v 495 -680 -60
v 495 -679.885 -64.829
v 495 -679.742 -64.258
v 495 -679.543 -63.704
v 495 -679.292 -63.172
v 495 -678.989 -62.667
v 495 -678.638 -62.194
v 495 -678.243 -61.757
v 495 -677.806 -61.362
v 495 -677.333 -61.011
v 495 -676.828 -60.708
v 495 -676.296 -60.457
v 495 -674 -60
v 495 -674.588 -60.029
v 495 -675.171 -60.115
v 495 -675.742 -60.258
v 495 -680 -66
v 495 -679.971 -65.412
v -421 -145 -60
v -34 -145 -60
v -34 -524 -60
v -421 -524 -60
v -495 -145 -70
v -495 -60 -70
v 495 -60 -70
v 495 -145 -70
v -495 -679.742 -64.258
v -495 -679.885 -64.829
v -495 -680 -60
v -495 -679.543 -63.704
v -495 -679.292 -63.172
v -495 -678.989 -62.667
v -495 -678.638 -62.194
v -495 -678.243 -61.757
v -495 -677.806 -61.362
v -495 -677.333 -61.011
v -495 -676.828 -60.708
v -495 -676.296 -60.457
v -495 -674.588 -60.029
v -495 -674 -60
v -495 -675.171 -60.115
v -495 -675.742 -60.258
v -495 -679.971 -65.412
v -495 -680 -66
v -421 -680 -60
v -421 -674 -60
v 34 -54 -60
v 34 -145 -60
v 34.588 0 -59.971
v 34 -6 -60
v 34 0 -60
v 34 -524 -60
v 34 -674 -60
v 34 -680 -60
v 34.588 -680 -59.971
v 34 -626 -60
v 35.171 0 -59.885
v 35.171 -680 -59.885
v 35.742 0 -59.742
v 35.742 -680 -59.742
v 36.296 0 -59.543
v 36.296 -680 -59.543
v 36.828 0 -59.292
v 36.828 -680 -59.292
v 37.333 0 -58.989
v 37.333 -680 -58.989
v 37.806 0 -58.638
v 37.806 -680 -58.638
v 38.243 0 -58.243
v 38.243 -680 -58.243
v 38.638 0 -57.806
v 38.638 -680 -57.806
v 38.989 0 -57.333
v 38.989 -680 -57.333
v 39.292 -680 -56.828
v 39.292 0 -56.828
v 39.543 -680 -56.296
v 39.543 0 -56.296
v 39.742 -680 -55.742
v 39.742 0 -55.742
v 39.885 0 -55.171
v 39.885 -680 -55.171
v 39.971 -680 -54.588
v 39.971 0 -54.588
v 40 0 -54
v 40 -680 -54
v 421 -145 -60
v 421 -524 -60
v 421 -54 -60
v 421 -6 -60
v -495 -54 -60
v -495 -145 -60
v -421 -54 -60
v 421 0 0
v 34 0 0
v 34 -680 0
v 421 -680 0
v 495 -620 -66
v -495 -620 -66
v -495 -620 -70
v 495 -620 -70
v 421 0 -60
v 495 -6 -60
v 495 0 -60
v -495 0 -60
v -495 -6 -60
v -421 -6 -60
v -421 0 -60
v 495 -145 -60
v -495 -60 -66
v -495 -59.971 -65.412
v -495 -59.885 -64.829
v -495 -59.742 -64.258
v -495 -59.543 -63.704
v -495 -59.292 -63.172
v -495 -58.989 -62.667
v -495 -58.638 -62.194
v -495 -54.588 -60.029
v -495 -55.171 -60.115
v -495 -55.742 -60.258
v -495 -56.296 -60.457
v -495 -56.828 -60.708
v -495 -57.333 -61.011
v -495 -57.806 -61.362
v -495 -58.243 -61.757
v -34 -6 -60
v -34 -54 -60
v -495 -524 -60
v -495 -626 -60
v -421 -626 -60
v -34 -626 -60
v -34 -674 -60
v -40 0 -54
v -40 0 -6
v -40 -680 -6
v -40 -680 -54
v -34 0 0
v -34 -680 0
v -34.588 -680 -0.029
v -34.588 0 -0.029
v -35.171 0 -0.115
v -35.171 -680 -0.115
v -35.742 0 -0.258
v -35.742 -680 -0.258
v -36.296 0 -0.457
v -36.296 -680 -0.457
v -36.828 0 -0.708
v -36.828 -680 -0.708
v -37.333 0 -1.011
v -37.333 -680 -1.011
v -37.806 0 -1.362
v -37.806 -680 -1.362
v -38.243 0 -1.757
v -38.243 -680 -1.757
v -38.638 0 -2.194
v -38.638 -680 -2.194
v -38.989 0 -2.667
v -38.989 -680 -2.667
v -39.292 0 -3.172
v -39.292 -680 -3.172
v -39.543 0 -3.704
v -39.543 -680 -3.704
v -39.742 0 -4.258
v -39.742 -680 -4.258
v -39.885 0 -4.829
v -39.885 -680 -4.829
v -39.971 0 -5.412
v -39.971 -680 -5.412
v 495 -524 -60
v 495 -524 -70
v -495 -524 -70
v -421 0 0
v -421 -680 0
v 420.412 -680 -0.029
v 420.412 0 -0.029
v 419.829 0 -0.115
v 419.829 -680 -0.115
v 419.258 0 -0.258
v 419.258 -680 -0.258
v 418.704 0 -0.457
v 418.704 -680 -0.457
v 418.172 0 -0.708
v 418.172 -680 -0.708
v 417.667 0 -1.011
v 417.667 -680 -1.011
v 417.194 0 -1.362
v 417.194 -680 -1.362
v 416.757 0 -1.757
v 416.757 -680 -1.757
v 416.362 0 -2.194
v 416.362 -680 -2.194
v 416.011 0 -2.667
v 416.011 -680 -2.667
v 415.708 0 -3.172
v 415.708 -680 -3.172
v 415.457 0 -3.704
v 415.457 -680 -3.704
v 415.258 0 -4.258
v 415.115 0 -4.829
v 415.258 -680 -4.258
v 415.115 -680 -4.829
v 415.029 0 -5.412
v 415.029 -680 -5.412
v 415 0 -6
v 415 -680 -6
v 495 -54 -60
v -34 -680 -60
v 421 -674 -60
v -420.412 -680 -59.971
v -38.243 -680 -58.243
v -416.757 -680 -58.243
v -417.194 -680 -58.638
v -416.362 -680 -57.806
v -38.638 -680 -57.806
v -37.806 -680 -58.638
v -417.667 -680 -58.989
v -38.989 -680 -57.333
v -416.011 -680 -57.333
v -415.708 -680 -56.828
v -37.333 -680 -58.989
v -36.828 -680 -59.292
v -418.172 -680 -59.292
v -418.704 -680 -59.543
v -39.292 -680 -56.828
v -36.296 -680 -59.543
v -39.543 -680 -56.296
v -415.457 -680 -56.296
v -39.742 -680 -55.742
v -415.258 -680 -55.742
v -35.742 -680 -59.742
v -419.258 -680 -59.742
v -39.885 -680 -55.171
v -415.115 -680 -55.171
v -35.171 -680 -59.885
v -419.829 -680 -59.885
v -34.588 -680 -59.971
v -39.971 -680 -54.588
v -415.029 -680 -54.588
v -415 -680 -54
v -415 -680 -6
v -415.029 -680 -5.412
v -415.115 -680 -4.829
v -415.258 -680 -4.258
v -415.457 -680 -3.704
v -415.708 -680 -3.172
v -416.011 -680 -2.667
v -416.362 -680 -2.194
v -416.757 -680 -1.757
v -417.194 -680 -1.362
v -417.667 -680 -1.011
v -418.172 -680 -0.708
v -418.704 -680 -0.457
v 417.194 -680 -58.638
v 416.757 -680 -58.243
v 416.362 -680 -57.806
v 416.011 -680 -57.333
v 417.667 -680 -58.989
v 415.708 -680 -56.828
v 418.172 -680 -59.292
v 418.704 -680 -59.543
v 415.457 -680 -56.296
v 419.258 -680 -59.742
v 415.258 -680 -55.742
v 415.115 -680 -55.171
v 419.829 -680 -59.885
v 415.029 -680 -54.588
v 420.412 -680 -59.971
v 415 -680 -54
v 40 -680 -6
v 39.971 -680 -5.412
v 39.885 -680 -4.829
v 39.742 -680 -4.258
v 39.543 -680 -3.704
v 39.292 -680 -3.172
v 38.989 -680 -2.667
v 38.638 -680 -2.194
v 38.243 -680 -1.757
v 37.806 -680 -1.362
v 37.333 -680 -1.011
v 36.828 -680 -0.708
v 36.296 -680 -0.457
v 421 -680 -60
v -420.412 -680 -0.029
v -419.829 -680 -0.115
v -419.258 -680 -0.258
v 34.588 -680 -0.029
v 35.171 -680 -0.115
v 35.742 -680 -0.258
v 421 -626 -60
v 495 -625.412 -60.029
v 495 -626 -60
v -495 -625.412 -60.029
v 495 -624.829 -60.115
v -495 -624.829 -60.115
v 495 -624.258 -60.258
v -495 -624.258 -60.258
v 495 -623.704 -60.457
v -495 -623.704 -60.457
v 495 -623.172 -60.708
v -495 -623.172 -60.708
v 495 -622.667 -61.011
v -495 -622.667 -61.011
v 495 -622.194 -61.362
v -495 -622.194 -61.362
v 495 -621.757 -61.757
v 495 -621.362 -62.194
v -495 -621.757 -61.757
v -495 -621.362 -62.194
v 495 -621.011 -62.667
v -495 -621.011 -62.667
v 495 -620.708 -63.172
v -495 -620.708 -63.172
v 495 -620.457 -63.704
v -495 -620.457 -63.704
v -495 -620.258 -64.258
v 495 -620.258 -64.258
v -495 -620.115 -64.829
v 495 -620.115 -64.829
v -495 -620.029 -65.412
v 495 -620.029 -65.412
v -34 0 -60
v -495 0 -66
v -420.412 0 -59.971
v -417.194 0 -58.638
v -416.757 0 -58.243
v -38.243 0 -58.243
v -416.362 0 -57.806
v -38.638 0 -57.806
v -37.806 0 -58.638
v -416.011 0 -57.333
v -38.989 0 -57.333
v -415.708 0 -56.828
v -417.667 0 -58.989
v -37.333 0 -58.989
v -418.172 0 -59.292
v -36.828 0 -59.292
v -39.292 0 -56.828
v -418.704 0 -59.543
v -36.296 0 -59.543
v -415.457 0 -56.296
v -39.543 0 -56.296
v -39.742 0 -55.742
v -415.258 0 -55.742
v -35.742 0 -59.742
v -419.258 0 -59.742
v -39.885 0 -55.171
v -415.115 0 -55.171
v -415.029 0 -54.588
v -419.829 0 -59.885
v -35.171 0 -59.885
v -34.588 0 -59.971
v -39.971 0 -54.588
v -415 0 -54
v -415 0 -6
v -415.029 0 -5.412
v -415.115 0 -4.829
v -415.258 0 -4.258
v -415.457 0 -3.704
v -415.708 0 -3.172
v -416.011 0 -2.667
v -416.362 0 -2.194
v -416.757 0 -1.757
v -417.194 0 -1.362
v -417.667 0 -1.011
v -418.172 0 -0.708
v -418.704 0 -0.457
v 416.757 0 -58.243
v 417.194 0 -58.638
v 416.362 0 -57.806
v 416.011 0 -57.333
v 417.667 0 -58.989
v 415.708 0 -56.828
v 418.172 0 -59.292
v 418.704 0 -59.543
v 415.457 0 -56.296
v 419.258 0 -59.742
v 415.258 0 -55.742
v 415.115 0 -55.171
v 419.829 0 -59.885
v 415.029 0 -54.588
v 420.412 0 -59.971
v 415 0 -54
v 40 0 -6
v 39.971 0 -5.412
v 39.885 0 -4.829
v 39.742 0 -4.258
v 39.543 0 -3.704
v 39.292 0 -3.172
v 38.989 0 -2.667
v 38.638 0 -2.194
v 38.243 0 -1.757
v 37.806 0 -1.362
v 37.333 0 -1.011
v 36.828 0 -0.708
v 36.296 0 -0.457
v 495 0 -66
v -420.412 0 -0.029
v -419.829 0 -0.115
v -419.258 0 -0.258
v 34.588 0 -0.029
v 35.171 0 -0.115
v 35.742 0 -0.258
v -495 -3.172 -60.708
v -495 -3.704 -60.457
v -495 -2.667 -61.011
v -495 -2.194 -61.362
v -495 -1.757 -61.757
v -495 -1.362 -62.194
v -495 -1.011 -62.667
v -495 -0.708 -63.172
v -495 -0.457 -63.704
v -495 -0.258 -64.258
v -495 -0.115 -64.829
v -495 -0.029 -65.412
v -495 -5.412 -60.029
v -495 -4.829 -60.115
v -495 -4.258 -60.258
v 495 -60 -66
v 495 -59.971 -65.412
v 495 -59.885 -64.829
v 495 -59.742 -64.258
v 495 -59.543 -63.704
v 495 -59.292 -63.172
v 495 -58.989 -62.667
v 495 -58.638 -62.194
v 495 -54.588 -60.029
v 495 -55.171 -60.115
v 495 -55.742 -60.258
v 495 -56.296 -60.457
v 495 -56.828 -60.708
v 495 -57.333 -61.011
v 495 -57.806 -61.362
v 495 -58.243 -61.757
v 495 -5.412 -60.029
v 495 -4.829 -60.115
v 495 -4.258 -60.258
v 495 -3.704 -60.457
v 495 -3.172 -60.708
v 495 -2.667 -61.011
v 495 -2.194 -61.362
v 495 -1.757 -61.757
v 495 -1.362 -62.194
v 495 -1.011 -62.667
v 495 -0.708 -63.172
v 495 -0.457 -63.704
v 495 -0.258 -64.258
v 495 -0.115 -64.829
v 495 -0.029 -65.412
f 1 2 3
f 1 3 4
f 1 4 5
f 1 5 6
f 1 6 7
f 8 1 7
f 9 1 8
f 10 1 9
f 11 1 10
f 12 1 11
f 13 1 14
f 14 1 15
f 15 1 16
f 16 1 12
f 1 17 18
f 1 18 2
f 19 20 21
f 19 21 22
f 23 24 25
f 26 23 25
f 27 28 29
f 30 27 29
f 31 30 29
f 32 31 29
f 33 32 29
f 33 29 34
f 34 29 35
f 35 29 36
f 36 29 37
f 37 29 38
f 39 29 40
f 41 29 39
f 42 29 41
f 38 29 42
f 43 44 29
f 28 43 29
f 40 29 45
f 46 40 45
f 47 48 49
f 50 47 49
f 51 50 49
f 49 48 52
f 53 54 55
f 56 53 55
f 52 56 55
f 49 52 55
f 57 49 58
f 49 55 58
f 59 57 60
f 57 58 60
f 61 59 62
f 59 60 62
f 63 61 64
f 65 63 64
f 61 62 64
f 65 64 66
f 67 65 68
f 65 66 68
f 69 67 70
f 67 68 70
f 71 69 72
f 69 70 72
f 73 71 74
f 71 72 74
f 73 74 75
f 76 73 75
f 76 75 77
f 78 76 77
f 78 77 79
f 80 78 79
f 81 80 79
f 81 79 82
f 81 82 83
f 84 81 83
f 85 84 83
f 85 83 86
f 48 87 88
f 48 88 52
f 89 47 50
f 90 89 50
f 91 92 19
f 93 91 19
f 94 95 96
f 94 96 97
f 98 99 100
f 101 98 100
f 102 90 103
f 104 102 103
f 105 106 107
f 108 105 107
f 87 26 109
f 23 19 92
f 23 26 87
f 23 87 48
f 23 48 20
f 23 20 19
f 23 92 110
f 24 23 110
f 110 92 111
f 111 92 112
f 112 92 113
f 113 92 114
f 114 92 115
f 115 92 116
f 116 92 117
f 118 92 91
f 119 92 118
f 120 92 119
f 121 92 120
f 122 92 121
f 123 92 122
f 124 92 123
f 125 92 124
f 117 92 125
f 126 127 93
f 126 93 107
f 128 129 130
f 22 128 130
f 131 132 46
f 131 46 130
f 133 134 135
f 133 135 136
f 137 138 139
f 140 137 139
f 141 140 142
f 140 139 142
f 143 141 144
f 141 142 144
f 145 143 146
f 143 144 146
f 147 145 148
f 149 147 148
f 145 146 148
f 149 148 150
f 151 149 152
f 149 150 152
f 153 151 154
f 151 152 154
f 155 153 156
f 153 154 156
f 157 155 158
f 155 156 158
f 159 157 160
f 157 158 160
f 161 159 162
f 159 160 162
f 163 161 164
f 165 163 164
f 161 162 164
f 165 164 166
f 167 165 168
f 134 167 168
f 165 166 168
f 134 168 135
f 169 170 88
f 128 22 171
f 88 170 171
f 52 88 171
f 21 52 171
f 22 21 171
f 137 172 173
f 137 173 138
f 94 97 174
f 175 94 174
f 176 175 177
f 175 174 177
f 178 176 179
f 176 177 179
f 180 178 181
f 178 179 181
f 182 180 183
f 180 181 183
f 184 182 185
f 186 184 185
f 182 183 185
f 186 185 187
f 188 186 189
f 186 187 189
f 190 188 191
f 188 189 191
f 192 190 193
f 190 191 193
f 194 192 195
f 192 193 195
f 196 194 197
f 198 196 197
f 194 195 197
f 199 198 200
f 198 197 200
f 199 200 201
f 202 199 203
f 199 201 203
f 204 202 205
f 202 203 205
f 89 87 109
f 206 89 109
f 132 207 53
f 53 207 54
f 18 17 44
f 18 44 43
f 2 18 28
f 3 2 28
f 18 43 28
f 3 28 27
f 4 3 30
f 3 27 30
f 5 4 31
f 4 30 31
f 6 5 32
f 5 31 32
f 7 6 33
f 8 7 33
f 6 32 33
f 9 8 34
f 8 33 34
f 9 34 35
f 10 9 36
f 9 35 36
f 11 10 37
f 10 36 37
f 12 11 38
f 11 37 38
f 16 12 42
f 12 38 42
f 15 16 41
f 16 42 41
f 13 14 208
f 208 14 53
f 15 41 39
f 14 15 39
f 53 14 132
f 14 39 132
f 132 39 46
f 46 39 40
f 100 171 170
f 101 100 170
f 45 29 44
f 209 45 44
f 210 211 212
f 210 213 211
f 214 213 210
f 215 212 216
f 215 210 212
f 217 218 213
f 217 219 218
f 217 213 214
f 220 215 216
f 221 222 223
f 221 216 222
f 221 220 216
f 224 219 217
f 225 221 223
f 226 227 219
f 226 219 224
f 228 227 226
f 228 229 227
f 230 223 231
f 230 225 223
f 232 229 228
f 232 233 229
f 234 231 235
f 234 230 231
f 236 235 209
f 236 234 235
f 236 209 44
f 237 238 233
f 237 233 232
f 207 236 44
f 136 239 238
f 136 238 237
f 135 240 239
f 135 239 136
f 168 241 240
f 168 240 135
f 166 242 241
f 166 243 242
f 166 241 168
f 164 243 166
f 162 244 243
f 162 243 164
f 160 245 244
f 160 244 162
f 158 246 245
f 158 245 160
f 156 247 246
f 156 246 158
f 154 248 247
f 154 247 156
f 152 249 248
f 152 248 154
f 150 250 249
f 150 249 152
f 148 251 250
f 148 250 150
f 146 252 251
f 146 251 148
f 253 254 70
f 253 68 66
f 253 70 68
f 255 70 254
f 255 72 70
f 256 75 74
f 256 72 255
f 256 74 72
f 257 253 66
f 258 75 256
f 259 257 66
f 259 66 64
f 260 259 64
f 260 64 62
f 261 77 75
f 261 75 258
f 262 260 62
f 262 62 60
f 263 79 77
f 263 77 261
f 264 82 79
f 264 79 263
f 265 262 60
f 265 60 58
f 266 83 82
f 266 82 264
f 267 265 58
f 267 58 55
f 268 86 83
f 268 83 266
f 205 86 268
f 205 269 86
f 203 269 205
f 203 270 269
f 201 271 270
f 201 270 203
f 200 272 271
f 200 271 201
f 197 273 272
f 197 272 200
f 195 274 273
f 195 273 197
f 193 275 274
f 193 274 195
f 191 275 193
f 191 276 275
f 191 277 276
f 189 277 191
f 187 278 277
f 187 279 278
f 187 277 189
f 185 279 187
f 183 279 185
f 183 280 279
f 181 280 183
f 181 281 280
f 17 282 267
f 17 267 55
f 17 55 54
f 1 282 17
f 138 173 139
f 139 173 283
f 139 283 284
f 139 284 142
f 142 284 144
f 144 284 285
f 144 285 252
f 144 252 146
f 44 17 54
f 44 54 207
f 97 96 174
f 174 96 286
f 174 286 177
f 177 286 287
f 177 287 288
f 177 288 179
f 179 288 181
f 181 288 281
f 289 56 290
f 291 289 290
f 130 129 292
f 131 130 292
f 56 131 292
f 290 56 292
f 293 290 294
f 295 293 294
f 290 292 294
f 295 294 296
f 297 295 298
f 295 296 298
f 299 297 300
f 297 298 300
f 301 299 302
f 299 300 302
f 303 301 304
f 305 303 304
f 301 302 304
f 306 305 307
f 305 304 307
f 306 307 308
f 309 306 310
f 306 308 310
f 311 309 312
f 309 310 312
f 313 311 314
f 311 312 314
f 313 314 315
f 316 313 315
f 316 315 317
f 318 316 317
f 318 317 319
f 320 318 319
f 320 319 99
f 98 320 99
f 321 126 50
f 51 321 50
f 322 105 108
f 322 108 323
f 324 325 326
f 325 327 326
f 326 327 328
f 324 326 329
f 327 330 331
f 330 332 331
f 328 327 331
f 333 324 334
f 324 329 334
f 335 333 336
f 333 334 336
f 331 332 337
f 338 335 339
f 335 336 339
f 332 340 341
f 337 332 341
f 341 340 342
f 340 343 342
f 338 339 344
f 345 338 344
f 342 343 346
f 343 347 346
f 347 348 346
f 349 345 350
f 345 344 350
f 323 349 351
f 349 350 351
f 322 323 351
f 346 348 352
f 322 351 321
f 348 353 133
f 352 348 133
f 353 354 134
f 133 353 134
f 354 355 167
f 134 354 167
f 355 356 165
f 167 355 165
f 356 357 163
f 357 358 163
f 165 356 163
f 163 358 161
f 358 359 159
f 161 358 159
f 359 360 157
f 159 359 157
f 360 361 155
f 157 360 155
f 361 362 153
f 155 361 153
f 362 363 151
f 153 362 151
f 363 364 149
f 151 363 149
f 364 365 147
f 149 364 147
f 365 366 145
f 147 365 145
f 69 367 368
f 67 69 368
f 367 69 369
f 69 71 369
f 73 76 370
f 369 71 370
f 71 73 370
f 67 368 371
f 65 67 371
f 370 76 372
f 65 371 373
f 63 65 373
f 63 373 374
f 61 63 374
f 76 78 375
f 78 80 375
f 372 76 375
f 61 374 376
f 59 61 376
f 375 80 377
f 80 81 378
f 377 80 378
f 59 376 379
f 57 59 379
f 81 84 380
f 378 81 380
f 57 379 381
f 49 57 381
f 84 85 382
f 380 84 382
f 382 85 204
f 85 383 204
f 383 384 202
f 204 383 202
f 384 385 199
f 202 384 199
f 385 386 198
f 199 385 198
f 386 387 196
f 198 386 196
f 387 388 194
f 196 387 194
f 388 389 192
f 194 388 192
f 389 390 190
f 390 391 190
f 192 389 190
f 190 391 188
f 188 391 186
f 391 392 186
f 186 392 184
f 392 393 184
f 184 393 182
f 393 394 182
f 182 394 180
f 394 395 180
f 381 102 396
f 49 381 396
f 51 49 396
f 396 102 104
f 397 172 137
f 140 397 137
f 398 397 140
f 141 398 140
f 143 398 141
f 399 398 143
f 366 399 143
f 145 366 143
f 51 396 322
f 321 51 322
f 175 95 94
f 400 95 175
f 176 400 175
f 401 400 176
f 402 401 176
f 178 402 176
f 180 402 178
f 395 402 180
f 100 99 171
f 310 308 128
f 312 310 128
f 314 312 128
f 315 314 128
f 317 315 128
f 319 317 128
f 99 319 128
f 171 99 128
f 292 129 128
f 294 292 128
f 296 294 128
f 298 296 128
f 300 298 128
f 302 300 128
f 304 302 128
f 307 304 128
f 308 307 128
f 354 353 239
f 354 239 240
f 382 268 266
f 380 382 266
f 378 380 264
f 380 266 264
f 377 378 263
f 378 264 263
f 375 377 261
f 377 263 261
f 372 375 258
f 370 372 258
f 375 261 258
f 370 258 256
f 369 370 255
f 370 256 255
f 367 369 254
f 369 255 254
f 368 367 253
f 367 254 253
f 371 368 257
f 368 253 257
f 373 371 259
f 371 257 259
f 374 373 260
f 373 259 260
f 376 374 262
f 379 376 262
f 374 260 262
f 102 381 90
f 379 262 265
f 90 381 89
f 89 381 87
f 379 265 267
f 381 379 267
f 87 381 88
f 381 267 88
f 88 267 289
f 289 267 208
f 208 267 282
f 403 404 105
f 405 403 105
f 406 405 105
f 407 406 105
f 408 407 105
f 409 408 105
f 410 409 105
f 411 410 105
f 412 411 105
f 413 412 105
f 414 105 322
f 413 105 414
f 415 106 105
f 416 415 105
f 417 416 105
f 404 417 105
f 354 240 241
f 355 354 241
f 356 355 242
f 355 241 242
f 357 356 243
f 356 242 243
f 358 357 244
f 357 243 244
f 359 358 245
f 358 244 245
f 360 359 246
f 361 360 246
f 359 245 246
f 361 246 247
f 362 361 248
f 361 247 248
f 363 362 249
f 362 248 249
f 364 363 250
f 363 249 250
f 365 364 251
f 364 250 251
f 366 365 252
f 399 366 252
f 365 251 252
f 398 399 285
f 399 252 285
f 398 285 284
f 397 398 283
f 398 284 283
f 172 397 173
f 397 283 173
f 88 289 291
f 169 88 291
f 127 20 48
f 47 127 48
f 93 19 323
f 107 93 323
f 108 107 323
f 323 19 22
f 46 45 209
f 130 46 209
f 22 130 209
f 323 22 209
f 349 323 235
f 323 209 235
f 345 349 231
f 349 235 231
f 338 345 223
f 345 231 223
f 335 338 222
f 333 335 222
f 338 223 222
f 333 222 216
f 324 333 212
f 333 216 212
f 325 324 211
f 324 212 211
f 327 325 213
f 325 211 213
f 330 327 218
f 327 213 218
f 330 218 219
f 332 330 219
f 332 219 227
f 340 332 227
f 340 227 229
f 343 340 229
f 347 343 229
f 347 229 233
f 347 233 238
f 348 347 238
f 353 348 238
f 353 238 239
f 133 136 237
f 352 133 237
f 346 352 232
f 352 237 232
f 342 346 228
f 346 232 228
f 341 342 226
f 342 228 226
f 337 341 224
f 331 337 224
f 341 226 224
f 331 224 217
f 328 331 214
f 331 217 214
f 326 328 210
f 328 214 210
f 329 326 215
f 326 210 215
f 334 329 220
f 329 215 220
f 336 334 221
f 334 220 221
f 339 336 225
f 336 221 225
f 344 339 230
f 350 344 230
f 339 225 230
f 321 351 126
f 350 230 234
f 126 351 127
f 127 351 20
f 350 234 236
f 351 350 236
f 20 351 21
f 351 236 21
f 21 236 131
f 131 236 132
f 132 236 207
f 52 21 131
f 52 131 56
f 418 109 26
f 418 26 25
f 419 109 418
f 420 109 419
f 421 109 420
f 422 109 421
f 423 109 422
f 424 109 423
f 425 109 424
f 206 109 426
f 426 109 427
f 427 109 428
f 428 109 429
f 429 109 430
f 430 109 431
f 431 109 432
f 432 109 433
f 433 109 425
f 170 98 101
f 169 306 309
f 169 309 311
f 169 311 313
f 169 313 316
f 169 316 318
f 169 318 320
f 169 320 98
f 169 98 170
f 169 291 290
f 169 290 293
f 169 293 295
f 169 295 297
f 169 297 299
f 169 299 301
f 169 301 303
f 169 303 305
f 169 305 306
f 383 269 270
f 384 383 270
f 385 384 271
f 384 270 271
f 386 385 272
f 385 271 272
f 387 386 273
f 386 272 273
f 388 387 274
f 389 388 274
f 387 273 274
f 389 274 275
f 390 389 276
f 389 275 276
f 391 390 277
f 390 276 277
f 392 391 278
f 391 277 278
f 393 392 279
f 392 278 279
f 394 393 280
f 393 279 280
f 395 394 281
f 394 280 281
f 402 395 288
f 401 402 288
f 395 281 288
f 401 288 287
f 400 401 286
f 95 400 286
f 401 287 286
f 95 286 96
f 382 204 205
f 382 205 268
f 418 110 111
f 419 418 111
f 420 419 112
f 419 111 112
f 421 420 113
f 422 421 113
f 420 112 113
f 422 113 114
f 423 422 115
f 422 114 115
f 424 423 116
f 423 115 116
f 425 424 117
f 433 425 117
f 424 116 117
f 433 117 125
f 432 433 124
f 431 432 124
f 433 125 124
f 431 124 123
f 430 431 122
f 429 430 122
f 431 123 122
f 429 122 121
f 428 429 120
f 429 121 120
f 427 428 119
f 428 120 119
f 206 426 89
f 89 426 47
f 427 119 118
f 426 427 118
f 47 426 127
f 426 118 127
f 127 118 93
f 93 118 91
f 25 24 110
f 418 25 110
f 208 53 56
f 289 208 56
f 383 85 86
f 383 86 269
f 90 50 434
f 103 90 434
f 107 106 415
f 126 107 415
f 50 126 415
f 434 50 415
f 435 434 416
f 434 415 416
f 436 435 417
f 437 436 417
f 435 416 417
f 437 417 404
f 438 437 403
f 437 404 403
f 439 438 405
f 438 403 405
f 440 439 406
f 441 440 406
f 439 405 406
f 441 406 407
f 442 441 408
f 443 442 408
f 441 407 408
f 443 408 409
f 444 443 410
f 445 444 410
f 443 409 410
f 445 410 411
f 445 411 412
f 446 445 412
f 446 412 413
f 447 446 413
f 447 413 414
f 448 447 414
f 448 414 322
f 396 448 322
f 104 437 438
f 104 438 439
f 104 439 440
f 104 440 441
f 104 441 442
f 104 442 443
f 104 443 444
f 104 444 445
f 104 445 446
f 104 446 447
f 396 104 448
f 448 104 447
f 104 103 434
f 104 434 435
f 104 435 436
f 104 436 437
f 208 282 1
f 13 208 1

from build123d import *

# Parameters (mm, degrees)
SKETCH1_W           = 990
SKETCH1_H           = 680
BOSS_EXTRUDE1_DEPTH = 70
SKETCH2_W           = 990
SKETCH2_H           = 379
CUT_EXTRUDE1_DEPTH  = 10
CUT_EXTRUDE2_DEPTH  = 1204.079382252
CUT_EXTRUDE4_DEPTH  = 844.993483387


with BuildPart() as part:
    # Sketch1 → Boss-Extrude1 (new body)
    with BuildSketch(Plane.XY):
        with Locations((0, -340)):
            Rectangle(SKETCH1_W, SKETCH1_H)
    extrude(amount=-BOSS_EXTRUDE1_DEPTH)

    # Sketch2 → Cut-Extrude1 (cut)
    with BuildSketch(Plane(origin=(0, 0, -70), x_dir=(-1, 0, 0), z_dir=(0, 0, -1))):
        with Locations((0, -334.5)):
            Rectangle(SKETCH2_W, SKETCH2_H)
    extrude(amount=-CUT_EXTRUDE1_DEPTH, mode=Mode.SUBTRACT)

    # Sketch3 → Cut-Extrude2 (cut, through all)
    with BuildSketch(Plane.ZY.offset(495)):
        with BuildLine():
            Line((-134, -680), (-66, -680))
            ThreePointArc((-66, -680), (-61.757359313, -678.242640687), (-60, -674))
            Line((-60, -674), (-60, -626))
            ThreePointArc((-60, -626), (-61.757359313, -621.757359313), (-66, -620))
            Line((-66, -620), (-134, -620))
            ThreePointArc((-134, -620), (-138.242640687, -621.757359313), (-140, -626))
            Line((-140, -626), (-140, -674))
            ThreePointArc((-140, -674), (-138.242640687, -678.242640687), (-134, -680))
        make_face()
        with BuildLine():
            Line((-134, -60), (-66, -60))
            ThreePointArc((-66, -60), (-61.757359313, -58.242640687), (-60, -54))
            Line((-60, -54), (-60, -6))
            ThreePointArc((-60, -6), (-61.757359313, -1.757359313), (-66, 0))
            Line((-66, 0), (-134, 0))
            ThreePointArc((-134, 0), (-138.242640687, -1.757359313), (-140, -6))
            Line((-140, -6), (-140, -54))
            ThreePointArc((-140, -54), (-138.242640687, -58.242640687), (-134, -60))
        make_face()
    extrude(amount=-CUT_EXTRUDE2_DEPTH, mode=Mode.SUBTRACT)

    # Sketch5 → Cut-Extrude4 (cut, through all)
    with BuildSketch(Plane.XZ.offset(680)):
        with BuildLine():
            ThreePointArc((495, -6), (493.242640687, -1.757359313), (489, 0))
            Line((489, 0), (489, -60))
            ThreePointArc((489, -60), (493.242640687, -58.242640687), (495, -54))
            Line((495, -54), (495, -6))
        make_face()
        with BuildLine():
            Line((489, 0), (421, 0))
            ThreePointArc((421, 0), (416.757359313, -1.757359313), (415, -6))
            Line((415, -6), (415, -54))
            ThreePointArc((415, -54), (416.757359313, -58.242640687), (421, -60))
            Line((421, -60), (489, -60))
            Line((489, -60), (489, 0))
        make_face()
        with BuildLine():
            Line((34, 0), (-34, 0))
            ThreePointArc((-34, 0), (-38.242640687, -1.757359313), (-40, -6))
            Line((-40, -6), (-40, -54))
            ThreePointArc((-40, -54), (-38.242640687, -58.242640687), (-34, -60))
            Line((-34, -60), (34, -60))
            ThreePointArc((34, -60), (38.242640687, -58.242640687), (40, -54))
            Line((40, -54), (40, -6))
            ThreePointArc((40, -6), (38.242640687, -1.757359313), (34, 0))
        make_face()
        with BuildLine():
            Line((-489, 0), (-489, -60))
            Line((-489, -60), (-421, -60))
            ThreePointArc((-421, -60), (-416.757359313, -58.242640687), (-415, -54))
            Line((-415, -54), (-415, -6))
            ThreePointArc((-415, -6), (-416.757359313, -1.757359313), (-421, 0))
            Line((-421, 0), (-489, 0))
        make_face()
        with BuildLine():
            ThreePointArc((-495, -54), (-493.242640687, -58.242640687), (-489, -60))
            Line((-489, -60), (-489, 0))
            ThreePointArc((-489, 0), (-493.242640687, -1.757359313), (-495, -6))
            Line((-495, -6), (-495, -54))
        make_face()
        with BuildLine():
            Line((-495, -60), (-489, -60))
            ThreePointArc((-489, -60), (-493.242640687, -58.242640687), (-495, -54))
            Line((-495, -54), (-495, -60))
        make_face()
        with BuildLine():
            ThreePointArc((-495, -6), (-493.242640687, -1.757359313), (-489, 0))
            Line((-489, 0), (-495, 0))
            Line((-495, 0), (-495, -6))
        make_face()
        with BuildLine():
            Line((495, 0), (489, 0))
            ThreePointArc((489, 0), (493.242640687, -1.757359313), (495, -6))
            Line((495, -6), (495, 0))
        make_face()
        with BuildLine():
            ThreePointArc((495, -54), (493.242640687, -58.242640687), (489, -60))
            Line((489, -60), (495, -60))
            Line((495, -60), (495, -54))
        make_face()
    extrude(amount=-CUT_EXTRUDE4_DEPTH, mode=Mode.SUBTRACT)


solid = part.part
